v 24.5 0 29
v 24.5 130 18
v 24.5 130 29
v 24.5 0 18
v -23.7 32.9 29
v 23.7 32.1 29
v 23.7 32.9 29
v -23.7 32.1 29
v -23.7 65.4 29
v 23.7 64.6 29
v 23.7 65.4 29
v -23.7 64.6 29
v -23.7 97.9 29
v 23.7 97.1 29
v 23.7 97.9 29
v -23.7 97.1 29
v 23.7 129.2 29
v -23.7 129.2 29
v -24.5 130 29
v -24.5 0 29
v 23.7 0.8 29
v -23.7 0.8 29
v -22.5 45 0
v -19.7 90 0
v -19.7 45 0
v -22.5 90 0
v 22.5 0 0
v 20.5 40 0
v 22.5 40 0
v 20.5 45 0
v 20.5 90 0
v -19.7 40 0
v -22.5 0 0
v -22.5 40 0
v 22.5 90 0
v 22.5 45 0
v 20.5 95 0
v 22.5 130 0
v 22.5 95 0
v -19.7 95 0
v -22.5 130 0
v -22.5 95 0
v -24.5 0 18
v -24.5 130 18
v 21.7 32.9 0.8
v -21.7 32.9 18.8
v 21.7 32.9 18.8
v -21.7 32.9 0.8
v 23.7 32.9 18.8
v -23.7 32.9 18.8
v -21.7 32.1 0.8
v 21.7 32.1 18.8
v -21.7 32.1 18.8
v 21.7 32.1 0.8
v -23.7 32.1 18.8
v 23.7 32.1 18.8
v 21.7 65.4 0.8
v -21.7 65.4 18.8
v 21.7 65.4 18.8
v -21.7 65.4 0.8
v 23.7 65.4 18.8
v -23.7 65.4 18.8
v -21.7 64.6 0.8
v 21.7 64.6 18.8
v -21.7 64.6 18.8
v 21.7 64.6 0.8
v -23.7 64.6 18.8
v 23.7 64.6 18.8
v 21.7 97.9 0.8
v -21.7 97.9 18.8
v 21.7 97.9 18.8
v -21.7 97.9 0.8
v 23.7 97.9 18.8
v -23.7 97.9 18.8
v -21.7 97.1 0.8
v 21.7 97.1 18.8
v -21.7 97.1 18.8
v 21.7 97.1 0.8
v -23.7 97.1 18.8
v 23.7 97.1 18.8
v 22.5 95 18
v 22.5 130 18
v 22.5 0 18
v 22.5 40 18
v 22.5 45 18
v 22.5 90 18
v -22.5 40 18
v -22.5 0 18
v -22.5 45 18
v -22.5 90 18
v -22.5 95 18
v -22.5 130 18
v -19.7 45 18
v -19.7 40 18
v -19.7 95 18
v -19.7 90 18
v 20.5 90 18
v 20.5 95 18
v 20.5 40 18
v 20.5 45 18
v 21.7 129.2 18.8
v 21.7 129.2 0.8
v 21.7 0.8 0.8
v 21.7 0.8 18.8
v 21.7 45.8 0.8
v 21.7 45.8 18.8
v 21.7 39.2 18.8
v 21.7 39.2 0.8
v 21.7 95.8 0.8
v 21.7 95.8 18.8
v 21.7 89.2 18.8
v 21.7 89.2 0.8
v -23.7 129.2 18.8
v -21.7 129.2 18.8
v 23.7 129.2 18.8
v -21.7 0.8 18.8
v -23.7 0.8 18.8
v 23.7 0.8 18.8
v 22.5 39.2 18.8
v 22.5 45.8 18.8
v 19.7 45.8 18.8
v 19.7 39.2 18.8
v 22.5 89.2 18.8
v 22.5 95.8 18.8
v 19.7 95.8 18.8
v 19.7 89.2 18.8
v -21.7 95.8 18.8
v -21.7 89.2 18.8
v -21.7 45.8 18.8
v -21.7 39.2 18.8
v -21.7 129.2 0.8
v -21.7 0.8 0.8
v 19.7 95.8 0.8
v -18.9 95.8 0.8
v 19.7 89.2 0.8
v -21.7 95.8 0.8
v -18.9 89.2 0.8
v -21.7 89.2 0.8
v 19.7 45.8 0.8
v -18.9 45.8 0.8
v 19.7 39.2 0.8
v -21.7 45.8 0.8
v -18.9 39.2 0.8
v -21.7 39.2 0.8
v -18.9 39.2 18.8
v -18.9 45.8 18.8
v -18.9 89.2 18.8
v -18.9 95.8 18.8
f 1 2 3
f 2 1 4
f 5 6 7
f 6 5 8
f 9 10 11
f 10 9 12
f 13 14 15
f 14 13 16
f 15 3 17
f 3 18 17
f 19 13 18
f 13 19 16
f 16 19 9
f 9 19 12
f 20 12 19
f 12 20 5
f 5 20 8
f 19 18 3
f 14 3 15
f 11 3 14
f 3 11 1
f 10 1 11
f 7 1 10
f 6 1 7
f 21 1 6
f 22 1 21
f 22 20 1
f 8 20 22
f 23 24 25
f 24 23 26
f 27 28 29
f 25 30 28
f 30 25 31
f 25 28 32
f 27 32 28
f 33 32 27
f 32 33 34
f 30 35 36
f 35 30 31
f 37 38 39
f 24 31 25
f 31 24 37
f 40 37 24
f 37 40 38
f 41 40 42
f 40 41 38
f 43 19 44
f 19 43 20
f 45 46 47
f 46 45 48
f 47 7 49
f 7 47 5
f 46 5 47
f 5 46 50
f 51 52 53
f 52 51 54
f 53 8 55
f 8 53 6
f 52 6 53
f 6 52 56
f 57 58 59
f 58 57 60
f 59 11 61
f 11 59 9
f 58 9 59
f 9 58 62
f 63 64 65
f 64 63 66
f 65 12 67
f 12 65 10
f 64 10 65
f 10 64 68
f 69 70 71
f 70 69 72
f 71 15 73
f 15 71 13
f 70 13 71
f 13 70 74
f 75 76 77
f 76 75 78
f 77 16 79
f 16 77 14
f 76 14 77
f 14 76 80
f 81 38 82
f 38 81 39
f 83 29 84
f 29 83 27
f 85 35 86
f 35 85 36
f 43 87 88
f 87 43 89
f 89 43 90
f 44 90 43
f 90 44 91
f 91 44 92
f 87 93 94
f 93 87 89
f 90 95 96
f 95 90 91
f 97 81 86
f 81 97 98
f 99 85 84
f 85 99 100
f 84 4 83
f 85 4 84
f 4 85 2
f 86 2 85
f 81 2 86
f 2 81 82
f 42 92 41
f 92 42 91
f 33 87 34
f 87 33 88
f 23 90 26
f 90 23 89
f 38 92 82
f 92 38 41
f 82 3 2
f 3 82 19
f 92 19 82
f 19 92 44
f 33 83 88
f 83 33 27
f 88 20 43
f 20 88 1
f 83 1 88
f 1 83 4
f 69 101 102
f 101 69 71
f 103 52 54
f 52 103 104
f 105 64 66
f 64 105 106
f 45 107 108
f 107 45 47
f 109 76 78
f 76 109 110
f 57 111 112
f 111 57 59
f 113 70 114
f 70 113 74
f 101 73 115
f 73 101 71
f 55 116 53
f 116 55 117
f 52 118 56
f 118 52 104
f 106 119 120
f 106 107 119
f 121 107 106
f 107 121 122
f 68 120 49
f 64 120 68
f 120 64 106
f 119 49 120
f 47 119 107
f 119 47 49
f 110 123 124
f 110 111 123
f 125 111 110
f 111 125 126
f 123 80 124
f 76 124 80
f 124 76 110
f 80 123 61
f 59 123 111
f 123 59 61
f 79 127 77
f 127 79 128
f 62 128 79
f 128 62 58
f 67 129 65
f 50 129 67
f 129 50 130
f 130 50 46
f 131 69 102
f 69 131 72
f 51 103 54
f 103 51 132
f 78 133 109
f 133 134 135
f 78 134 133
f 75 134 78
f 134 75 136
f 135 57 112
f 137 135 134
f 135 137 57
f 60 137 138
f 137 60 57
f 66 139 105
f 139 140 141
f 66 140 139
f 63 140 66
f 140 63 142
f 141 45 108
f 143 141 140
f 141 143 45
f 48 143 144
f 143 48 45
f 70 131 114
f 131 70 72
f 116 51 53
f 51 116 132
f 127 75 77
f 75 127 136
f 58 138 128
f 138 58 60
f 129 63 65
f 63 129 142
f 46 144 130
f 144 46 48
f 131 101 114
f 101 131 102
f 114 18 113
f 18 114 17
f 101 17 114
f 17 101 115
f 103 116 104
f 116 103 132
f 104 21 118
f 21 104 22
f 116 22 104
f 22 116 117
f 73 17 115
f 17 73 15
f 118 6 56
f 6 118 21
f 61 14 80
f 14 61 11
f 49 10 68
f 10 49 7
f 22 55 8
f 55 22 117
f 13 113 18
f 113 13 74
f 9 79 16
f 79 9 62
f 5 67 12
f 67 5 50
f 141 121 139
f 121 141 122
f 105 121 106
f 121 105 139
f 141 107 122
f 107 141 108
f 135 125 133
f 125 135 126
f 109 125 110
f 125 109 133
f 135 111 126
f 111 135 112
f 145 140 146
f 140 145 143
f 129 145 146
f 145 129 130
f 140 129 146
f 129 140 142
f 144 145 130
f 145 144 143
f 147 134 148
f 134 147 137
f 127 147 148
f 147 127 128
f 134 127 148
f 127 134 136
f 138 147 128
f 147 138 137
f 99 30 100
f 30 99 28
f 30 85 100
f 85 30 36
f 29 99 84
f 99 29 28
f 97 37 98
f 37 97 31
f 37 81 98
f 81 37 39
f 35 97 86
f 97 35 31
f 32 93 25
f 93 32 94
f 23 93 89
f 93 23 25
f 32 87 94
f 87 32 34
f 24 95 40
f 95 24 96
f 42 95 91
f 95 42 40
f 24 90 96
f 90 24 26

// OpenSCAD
/********************************************************************
*   Parametric Small Parts Drawer Divider                           *
*   (c) 2017 R. Jamieson                                            *
********************************************************************/
//Construct the dividers
HSections = 1;          //Number of horizontal sections
VSections = 4;          //Number of vertical sections
FullHeight = 1;         //Full height walls =1 otherwise half height
wallThickness = 0.8;   //Wall thickness

//Drawer inside dimensions
dMajorWidth=49;
dMinorWidth=45;
dMinorHeight=18;
dLength=130;
dHeight=29;
cutoutWidth=5;
cutoutDepth=2;
cutoutOffset=40;


module box() {
    difference() {
        union() {
            translate([-dMinorWidth/2,0,0]) cube([dMinorWidth,dLength,dMinorHeight]);
            translate([-dMajorWidth/2,0,dMinorHeight]) cube([dMajorWidth,dLength,dHeight-dMinorHeight]);
        }
        //Difference cutting objects below
        translate([-(dMinorWidth-2*wallThickness)/2,wallThickness,wallThickness]) cube([dMinorWidth-2*wallThickness,dLength-2*wallThickness,dMinorHeight]);
            translate([-(dMajorWidth-2*wallThickness)/2,wallThickness,dMinorHeight+wallThickness]) cube([dMajorWidth-2*wallThickness,dLength-2*wallThickness,dHeight-dMinorHeight]);
    }
}


module dividers() {
    union(){
        //Create Horizontal Sections
        if (HSections >1) {
            for (i=[1:HSections-1]) {
                if (FullHeight == 1) 
                translate([((dMajorWidth/HSections)*i)-(wallThickness/2)-dMajorWidth/2,0,0]) cube([wallThickness, dLength,dHeight]);
                else
                    translate([((dMajorWidth/HSections)*i)-(wallThickness/2)-dMajorWidth/2,0,0]) cube([wallThickness, dLength,dMinorHeight]);
            }
        }

        //Create Vertical Sections    
        for (i=[1:VSections-1]) {
            if (FullHeight == 1)
                translate([-dMajorWidth/2,(dLength/VSections)*i-(wallThickness/2),0]) cube([dMajorWidth,wallThickness,dHeight]);
           else
               translate([-dMajorWidth/2,(dLength/VSections)*i-(wallThickness/2),0]) cube([dMajorWidth,wallThickness,dMinorHeight]);
        }
    }
}

module assembly() {
    union(){
        dividers();
        
        difference(){
            union(){
                box();
                //Add cutout walls
                translate([dMinorWidth/2-cutoutDepth-wallThickness,cutoutOffset-wallThickness,0]) cube([cutoutDepth+wallThickness,cutoutWidth+2*wallThickness,dMinorHeight+wallThickness]);  
                translate([dMinorWidth/2-cutoutDepth-wallThickness,dLength-cutoutOffset-wallThickness,0]) cube([cutoutDepth+wallThickness,cutoutWidth+2*wallThickness,dMinorHeight+wallThickness]);
                translate([-dMinorWidth/2+wallThickness,cutoutOffset-wallThickness,0]) cube([cutoutDepth+wallThickness,cutoutWidth+2*wallThickness,dMinorHeight+wallThickness]);
                translate([-dMinorWidth/2+wallThickness,dLength-cutoutOffset-wallThickness,0]) cube([cutoutDepth+wallThickness,cutoutWidth+2*wallThickness,dMinorHeight+wallThickness]);
                }
            //difference cutouts
            translate([dMinorWidth/2-cutoutDepth,cutoutOffset,-wallThickness]) cube([cutoutDepth+wallThickness,cutoutWidth,dMinorHeight+wallThickness]);
            translate([dMinorWidth/2-cutoutDepth,dLength-cutoutOffset,-wallThickness]) cube([cutoutDepth+wallThickness,cutoutWidth,dMinorHeight+wallThickness]);
            translate([-dMinorWidth/2,cutoutOffset,-wallThickness]) cube([cutoutDepth+wallThickness,cutoutWidth,dMinorHeight+wallThickness]);
            translate([-dMinorWidth/2,dLength-cutoutOffset,-wallThickness]) cube([cutoutDepth+wallThickness,cutoutWidth,dMinorHeight+wallThickness]);
            } 
        }
}

//Cleanup
difference(){
    assembly();
    //Trim sides
    translate([dMinorWidth/2,0,-wallThickness]) cube([10,dLength,dMinorHeight+wallThickness]);
    translate([-dMinorWidth/2-10,0,-wallThickness]) cube([10,dLength,dMinorHeight+wallThickness]);
    //trim cutouts
    translate([dMinorWidth/2-cutoutDepth,cutoutOffset,-wallThickness]) cube([cutoutDepth+wallThickness,cutoutWidth,dMinorHeight+wallThickness]);
    translate([dMinorWidth/2-cutoutDepth,dLength-cutoutOffset,-wallThickness]) cube([cutoutDepth+wallThickness,cutoutWidth,dMinorHeight+wallThickness]);
    translate([-dMinorWidth/2,cutoutOffset,-wallThickness]) cube([cutoutDepth+wallThickness,cutoutWidth,dMinorHeight+wallThickness]);
    translate([-dMinorWidth/2,dLength-cutoutOffset,-wallThickness]) cube([cutoutDepth+wallThickness,cutoutWidth,dMinorHeight+wallThickness]);
}
